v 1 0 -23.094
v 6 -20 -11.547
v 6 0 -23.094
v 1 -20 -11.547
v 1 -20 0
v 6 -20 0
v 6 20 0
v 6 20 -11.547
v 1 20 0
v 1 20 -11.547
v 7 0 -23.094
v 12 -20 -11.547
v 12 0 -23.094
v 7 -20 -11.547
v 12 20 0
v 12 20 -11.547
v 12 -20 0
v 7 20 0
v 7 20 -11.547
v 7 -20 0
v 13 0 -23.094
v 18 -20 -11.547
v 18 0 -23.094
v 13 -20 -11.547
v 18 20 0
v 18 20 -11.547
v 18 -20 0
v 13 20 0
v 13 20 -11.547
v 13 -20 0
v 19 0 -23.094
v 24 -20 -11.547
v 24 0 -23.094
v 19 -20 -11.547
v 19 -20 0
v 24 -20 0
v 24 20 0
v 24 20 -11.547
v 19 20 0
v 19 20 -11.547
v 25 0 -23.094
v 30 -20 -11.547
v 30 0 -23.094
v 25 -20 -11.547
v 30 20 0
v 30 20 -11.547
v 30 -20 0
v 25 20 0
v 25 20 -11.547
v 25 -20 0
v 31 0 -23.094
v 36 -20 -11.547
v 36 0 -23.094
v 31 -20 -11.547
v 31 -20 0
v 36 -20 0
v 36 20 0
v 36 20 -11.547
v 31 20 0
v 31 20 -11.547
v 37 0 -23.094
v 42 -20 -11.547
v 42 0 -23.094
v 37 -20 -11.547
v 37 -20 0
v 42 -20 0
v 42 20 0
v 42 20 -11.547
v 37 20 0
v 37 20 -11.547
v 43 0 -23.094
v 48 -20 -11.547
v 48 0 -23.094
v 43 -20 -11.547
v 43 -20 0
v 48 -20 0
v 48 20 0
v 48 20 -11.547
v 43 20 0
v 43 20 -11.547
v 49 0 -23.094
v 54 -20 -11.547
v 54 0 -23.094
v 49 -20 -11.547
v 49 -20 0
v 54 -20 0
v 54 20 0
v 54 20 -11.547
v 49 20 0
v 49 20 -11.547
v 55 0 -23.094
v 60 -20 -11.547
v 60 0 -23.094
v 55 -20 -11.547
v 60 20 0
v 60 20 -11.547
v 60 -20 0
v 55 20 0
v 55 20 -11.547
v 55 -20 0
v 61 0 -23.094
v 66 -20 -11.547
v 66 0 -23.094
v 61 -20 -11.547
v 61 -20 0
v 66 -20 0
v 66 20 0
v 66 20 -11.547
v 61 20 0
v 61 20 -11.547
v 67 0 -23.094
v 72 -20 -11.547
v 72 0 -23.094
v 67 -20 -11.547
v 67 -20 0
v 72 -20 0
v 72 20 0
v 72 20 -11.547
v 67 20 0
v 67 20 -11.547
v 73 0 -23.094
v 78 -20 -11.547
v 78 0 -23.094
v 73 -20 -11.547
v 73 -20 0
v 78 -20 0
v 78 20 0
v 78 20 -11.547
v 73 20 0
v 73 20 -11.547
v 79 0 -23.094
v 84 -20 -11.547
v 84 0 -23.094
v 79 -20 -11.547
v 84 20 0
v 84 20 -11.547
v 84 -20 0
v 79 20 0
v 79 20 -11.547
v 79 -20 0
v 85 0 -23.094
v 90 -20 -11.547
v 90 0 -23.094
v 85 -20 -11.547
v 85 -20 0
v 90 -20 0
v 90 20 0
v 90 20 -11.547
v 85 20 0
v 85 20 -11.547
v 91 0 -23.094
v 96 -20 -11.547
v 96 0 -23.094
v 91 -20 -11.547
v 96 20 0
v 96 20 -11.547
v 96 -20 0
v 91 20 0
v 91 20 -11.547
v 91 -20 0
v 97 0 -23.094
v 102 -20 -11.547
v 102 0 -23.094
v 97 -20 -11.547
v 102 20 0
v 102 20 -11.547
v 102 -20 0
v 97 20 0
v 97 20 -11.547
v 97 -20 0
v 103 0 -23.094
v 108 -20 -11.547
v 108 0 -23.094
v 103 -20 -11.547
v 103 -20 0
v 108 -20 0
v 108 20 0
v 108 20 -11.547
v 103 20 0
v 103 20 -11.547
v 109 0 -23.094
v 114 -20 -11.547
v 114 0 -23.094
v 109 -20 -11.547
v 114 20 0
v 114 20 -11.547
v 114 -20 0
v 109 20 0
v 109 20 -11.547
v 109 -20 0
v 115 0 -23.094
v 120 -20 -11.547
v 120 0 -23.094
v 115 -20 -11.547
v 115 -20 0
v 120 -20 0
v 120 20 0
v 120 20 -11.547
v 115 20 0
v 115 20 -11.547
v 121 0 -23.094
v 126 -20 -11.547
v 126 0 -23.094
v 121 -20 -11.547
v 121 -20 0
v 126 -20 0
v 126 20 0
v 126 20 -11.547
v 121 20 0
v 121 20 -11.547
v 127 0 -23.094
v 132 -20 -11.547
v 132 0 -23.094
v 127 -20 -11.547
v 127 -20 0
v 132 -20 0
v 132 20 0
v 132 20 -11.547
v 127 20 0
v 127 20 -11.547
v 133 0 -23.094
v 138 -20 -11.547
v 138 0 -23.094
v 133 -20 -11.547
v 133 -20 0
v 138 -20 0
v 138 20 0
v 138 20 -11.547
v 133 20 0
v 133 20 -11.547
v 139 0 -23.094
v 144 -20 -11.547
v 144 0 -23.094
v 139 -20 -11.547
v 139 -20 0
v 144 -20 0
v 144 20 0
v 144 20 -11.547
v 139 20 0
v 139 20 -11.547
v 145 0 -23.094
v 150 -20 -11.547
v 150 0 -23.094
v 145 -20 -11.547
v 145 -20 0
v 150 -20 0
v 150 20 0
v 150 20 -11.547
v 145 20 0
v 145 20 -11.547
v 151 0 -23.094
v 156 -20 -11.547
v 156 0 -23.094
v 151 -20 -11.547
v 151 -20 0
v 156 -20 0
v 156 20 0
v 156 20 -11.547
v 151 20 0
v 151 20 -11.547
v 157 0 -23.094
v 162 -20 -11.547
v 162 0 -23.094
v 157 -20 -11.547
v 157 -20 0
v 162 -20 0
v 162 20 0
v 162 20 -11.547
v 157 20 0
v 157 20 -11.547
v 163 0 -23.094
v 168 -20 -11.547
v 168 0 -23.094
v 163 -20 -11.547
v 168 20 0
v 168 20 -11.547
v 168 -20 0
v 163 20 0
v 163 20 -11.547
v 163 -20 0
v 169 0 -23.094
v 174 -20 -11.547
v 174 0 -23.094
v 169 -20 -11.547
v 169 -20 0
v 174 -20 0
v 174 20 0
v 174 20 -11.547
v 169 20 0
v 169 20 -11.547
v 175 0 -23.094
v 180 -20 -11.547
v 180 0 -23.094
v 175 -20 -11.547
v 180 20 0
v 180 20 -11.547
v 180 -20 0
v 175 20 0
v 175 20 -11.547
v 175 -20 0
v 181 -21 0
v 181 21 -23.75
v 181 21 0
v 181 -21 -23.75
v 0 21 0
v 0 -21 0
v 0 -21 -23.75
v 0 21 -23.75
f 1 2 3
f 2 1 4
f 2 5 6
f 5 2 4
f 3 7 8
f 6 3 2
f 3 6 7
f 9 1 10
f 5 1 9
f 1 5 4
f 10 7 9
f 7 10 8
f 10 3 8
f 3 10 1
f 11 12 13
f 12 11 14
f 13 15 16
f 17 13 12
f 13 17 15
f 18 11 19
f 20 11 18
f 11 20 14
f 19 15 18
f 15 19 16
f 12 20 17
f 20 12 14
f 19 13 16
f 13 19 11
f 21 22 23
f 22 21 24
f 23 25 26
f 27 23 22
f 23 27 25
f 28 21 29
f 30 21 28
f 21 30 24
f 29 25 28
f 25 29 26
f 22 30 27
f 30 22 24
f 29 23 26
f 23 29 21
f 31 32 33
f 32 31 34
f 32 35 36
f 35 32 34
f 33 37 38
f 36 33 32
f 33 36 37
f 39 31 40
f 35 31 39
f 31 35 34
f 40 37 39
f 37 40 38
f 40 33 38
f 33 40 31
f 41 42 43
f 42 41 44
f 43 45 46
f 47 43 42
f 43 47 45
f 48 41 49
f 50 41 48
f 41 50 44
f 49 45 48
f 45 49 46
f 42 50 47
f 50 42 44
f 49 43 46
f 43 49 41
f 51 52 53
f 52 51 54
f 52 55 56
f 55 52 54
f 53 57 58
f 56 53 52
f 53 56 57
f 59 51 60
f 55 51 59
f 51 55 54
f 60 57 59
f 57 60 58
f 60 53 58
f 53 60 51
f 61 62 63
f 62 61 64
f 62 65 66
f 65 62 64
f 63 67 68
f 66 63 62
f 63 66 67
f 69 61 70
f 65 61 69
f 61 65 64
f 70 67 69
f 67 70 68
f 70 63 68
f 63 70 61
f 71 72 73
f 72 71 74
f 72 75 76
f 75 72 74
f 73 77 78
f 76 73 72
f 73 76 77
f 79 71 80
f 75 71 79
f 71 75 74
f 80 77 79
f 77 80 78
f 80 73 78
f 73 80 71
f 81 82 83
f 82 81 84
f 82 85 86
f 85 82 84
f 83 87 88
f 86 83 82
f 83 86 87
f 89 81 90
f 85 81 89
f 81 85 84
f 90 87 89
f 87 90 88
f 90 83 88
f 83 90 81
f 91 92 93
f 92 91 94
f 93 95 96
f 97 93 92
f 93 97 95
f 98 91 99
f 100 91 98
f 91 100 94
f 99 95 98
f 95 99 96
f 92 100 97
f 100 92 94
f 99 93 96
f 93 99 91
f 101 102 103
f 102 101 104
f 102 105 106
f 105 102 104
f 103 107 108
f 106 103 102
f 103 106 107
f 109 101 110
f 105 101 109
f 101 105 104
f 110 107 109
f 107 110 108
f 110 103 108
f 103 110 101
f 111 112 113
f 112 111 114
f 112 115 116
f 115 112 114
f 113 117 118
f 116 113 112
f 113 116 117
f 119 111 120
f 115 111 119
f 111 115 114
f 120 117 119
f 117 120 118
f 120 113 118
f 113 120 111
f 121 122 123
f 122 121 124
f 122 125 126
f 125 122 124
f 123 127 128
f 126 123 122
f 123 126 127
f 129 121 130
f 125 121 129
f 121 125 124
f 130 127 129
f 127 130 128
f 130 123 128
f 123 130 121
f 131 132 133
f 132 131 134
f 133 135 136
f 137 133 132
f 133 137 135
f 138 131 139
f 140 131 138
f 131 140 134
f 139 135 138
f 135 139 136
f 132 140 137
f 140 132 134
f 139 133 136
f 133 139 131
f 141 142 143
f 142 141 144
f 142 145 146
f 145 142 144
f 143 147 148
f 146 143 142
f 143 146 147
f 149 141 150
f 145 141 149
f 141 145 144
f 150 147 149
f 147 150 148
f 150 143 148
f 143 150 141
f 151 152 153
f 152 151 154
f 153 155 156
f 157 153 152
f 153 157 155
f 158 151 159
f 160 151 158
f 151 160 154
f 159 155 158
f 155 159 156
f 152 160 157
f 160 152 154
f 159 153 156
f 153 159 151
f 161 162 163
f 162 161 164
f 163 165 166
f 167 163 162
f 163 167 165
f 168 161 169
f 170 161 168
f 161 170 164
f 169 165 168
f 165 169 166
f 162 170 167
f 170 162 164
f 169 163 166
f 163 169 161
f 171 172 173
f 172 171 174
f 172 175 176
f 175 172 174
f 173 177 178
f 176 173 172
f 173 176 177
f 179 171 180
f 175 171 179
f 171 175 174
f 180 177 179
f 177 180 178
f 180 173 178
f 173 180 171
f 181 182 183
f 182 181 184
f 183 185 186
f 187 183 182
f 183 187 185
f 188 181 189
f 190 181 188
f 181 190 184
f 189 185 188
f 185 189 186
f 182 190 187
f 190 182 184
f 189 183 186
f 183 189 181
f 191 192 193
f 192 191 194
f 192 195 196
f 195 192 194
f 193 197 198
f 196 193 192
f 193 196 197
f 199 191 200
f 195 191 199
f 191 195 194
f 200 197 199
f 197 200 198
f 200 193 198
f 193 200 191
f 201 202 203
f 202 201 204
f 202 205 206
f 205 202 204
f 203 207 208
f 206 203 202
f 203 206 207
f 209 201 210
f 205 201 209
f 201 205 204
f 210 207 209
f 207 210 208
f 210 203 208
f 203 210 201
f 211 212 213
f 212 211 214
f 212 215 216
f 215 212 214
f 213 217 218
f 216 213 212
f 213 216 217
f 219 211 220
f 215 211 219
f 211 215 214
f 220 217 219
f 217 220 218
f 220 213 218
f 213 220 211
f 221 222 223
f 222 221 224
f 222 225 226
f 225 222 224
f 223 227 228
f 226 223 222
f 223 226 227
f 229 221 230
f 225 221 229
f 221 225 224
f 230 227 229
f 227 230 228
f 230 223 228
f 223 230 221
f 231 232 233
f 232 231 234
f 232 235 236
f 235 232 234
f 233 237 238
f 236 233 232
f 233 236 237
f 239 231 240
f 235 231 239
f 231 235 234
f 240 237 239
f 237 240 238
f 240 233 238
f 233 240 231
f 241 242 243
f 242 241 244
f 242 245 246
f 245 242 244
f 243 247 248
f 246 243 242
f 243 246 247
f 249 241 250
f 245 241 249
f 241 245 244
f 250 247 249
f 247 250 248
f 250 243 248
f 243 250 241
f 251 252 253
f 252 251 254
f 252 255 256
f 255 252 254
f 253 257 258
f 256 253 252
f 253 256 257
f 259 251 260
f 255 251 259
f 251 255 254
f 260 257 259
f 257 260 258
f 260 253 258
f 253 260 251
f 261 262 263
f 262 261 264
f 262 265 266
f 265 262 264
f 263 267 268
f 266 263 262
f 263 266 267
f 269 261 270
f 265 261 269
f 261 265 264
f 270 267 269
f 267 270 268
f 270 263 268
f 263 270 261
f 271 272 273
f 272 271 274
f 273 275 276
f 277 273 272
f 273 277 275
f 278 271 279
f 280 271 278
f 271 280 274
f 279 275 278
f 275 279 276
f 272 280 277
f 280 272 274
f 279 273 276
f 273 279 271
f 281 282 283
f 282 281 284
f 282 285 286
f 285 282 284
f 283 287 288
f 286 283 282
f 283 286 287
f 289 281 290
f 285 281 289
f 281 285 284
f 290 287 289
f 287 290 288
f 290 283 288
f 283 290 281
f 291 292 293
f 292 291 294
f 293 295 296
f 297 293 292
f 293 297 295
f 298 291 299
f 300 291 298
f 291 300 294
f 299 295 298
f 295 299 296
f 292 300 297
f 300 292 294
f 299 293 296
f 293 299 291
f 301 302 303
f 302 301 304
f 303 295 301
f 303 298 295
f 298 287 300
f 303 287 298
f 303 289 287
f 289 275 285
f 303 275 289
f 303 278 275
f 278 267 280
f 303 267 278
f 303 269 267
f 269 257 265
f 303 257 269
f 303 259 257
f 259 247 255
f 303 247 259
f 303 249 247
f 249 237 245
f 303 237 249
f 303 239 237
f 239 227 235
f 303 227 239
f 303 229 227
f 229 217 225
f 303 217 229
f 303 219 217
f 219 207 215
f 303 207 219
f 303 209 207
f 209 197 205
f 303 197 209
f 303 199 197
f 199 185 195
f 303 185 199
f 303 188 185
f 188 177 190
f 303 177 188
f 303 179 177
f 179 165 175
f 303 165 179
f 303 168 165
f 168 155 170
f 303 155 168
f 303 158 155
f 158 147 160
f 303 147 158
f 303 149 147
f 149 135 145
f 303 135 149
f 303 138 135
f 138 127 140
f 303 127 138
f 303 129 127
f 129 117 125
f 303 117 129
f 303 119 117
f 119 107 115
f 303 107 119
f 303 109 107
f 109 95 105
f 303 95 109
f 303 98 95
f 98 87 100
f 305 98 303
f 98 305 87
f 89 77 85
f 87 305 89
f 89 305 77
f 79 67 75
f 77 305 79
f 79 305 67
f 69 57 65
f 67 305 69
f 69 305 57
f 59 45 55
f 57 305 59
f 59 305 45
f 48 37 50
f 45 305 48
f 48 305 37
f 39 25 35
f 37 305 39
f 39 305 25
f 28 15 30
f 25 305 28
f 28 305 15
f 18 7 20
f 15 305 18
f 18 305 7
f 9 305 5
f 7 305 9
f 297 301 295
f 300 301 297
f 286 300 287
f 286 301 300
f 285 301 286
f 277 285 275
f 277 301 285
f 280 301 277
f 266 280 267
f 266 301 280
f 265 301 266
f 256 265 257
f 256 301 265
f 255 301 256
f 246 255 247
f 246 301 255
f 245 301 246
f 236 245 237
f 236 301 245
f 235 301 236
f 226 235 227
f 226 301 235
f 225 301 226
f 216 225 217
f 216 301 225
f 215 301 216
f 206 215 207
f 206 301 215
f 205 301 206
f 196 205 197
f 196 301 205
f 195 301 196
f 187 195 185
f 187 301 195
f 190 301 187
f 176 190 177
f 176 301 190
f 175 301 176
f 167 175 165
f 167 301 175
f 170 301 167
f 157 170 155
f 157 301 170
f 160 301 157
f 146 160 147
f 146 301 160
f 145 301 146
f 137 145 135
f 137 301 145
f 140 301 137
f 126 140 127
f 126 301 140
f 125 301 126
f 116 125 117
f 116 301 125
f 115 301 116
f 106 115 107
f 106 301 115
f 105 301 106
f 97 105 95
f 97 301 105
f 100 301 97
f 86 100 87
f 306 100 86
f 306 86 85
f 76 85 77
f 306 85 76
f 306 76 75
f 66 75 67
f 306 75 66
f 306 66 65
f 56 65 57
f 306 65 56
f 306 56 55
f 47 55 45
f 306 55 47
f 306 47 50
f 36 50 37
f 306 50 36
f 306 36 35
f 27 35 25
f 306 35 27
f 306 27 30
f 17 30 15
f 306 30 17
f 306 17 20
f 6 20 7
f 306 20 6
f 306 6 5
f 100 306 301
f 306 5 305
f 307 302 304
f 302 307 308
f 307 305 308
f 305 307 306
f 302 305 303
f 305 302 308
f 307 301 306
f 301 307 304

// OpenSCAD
include <../Scripts/18xx tiles basic functions.scad>
// 30 pcs means 181 mm long
hexes=30;
yt=hex_size+4*width;
zt=1.25*hex_size;
difference() {
    translate([0,-yt,-zt]) cube([6*hexes+1,2*yt,zt]);
    for(i=[0:(hexes-1)]){
            translate([1+i*6,0,0]) rotate([0,90,0]) linear_extrude(5) regular_polygon(6,hex_size+2*width);
    }
}    
